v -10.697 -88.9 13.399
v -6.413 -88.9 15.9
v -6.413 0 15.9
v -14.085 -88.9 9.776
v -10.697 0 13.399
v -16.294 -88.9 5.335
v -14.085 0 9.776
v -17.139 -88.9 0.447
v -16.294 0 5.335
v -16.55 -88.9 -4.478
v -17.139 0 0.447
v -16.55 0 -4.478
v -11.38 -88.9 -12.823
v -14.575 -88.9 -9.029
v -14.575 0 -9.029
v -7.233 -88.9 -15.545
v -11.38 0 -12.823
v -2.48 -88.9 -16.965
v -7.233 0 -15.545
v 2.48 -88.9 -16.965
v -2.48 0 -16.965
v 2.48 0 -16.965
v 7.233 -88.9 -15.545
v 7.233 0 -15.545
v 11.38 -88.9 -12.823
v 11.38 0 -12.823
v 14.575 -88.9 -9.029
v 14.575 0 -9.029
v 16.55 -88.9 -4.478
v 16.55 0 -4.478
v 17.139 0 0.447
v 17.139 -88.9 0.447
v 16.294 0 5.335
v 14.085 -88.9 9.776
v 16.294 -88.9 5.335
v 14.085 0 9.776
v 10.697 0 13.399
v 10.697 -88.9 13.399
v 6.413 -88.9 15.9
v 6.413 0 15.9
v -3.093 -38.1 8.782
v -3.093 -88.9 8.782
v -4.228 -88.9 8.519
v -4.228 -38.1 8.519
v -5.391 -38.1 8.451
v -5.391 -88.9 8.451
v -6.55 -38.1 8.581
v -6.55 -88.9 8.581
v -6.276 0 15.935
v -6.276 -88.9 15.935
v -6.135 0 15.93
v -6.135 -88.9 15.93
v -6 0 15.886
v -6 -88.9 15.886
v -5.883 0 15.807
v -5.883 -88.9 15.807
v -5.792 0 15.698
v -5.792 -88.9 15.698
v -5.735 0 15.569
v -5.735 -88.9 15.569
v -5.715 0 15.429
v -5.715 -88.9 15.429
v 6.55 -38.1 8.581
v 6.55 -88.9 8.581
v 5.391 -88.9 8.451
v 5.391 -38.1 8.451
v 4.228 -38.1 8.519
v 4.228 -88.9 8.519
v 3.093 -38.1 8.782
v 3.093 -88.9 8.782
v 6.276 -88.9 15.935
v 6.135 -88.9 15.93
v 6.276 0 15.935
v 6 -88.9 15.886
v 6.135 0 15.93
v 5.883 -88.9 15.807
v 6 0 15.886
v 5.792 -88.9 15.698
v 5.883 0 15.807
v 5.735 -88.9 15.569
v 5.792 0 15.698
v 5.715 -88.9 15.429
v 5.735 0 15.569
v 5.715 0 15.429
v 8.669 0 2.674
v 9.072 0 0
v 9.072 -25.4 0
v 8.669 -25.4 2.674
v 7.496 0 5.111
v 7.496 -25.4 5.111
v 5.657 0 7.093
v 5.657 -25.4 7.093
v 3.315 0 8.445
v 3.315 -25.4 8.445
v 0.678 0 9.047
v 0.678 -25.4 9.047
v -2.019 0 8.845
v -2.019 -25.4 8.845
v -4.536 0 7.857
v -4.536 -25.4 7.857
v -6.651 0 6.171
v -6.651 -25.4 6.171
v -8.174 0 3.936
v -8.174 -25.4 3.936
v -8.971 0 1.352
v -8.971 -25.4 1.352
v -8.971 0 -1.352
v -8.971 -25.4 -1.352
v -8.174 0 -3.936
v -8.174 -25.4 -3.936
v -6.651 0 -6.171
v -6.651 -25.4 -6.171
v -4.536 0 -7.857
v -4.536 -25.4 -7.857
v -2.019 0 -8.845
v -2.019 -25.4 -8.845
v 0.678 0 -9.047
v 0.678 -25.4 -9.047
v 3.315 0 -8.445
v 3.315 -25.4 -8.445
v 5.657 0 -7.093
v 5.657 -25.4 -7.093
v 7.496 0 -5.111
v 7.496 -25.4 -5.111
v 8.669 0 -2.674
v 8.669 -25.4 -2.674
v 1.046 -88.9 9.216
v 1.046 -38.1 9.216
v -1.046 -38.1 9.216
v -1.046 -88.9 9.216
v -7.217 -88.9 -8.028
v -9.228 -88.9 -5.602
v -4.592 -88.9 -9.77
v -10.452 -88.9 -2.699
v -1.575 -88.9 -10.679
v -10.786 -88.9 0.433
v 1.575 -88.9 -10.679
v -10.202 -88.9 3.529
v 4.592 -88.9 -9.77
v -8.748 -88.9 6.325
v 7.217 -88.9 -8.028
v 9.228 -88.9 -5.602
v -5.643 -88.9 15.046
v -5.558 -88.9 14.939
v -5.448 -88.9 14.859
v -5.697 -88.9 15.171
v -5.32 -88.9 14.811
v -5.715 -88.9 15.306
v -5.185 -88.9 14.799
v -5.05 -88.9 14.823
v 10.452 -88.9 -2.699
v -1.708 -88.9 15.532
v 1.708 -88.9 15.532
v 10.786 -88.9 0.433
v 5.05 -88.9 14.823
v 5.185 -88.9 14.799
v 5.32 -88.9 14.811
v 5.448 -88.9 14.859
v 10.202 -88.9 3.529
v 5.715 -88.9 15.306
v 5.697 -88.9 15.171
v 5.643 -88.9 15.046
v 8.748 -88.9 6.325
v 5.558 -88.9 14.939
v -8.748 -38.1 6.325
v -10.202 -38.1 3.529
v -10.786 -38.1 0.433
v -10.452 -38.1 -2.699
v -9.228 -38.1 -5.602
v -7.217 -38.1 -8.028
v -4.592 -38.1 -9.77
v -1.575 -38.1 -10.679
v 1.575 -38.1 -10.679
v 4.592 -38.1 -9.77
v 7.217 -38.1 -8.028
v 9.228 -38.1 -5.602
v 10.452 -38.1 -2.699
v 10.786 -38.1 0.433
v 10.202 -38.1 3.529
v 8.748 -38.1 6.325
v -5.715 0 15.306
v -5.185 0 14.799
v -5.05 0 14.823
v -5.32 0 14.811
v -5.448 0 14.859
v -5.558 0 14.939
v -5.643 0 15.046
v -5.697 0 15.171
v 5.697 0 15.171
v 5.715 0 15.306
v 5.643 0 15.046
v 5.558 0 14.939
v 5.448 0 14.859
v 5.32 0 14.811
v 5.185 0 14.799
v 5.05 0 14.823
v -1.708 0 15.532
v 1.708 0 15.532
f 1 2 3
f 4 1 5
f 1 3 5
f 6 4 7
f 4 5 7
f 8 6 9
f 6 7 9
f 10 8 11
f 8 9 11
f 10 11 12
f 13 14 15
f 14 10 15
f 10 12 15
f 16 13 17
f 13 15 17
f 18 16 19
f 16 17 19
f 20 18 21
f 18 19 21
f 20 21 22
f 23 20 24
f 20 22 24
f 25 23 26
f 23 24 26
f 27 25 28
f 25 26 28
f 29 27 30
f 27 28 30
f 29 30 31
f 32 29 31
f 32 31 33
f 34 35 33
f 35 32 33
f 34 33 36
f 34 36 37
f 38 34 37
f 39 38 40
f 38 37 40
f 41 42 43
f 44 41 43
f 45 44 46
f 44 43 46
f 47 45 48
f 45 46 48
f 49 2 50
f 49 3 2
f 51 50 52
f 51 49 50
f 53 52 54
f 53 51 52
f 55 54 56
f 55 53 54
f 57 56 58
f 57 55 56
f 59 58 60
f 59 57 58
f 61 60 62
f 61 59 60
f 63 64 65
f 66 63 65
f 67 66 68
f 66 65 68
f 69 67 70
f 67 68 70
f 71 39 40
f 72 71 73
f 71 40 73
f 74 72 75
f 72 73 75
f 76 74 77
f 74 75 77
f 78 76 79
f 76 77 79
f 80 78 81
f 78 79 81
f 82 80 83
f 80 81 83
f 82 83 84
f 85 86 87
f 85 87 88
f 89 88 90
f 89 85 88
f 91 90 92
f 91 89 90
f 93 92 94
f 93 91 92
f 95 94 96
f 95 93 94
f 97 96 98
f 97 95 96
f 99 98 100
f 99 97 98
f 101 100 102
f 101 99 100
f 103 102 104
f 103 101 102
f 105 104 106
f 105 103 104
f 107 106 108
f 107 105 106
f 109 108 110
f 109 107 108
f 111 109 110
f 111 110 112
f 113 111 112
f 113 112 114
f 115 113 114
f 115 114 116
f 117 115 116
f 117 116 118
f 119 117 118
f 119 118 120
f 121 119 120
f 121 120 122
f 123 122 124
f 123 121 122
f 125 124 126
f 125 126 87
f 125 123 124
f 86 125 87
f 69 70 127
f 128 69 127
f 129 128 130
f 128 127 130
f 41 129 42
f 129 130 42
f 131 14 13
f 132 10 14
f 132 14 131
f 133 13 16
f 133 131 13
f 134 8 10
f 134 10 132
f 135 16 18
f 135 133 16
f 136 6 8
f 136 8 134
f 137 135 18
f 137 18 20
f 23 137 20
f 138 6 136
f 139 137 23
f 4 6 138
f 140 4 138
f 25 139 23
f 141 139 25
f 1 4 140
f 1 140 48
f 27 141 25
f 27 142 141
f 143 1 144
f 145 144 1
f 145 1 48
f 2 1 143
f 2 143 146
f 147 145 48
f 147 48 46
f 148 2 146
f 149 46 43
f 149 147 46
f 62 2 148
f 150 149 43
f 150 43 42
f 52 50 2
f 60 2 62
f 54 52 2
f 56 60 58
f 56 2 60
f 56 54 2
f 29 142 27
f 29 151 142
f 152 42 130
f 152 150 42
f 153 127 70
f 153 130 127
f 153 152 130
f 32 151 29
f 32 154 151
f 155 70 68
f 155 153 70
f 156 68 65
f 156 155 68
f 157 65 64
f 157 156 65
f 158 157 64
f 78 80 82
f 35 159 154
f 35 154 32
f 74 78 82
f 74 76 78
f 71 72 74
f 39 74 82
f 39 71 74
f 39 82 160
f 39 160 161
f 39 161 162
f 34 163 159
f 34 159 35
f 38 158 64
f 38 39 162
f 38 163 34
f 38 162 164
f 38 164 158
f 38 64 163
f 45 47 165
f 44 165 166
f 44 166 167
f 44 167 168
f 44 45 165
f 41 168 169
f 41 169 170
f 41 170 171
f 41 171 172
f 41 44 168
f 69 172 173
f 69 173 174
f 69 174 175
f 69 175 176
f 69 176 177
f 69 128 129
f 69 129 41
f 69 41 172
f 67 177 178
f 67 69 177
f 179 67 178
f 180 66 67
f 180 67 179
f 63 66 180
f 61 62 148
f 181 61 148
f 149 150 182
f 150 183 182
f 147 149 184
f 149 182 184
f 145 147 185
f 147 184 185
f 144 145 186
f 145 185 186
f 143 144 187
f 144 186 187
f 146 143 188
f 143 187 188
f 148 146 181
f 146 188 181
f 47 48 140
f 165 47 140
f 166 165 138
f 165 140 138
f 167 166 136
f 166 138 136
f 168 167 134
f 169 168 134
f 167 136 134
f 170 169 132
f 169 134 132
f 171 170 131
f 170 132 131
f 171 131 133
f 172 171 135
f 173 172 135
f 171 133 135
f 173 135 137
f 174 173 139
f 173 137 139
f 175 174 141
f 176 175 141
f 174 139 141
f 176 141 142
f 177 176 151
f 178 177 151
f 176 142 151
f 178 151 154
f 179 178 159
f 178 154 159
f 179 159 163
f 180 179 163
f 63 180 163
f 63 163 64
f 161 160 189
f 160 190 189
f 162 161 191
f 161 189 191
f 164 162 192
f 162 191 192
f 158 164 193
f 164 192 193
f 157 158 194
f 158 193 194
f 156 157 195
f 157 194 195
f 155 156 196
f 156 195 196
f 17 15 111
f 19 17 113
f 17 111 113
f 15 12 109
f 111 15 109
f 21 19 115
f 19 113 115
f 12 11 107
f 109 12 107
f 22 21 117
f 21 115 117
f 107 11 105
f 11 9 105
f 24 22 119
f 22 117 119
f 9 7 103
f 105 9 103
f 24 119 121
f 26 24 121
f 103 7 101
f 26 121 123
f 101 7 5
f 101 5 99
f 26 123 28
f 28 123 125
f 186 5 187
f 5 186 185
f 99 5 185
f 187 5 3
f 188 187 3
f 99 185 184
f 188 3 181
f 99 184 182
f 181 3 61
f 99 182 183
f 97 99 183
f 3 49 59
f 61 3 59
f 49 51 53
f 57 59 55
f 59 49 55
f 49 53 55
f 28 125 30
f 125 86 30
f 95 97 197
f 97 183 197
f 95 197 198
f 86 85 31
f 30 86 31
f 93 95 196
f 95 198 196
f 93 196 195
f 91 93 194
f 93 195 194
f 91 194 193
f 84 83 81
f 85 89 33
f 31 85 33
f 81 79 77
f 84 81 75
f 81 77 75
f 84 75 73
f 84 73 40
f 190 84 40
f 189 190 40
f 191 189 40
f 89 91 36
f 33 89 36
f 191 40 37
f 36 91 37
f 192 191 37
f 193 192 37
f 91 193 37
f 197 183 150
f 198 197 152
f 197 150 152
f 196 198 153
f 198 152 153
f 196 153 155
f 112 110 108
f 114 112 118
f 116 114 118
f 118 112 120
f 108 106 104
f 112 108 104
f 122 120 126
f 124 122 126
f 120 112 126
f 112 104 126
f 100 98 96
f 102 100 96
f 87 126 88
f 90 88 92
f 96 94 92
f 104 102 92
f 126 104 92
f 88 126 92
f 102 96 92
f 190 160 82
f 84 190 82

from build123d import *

# Parameters (mm, degrees)
F0_R     = 17.145
F0_R_2   = 9.0724925833
F1_DEPTH = 88.9
F2_DEPTH = 25.4
F4_DEPTH = 88.901
F5_R     = 0.508
F7_DEPTH = 50.8


with BuildPart() as f1:
    # F0 (on Front) → F1 (new body)
    with BuildSketch(Plane.XZ):
        Circle(F0_R)
        Circle(F0_R_2, mode=Mode.SUBTRACT)
        Circle(F0_R_2)
    extrude(amount=F1_DEPTH)

    # F0 (on Front) → F2 (cut)
    with BuildSketch(Plane.XZ):
        Circle(F0_R_2)
    extrude(amount=F2_DEPTH, mode=Mode.SUBTRACT)

    # F3 (on face) → F4 (cut, through all)
    with BuildSketch(Plane.XZ.offset(88.9)):
        with BuildLine():
            ThreePointArc((-5.715, 14.5918745599), (0, 15.621), (5.715, 14.5918745599))
            Line((5.715, 14.5918745599), (5.715, 16.1644610179))
            ThreePointArc((5.715, 16.1644610179), (2.8992534253, 16.8980873053), (0, 17.145))
            ThreePointArc((0, 17.145), (-2.8992534253, 16.8980873053), (-5.715, 16.1644610179))
            Line((-5.715, 16.1644610179), (-5.715, 14.5918745599))
        make_face()
    extrude(amount=-F4_DEPTH, mode=Mode.SUBTRACT)

    # F5
    f5_edges = [f1.edges().sort_by_distance(p)[0] for p in [
        (-5.715, -44.45, 16.164461),
        (5.715, -44.45, 16.164461),
        (-5.715, -44.45, 14.591875),
        (5.715, -44.45, 14.591875),
    ]]
    fillet(f5_edges, radius=F5_R)

    # F6 (on face) → F7 (cut)
    with BuildSketch(Plane.XZ.offset(88.9)):
        with BuildLine():
            ThreePointArc((-3.0928797021, 8.7823797249), (-4.8083158044, 8.4599845105), (-6.5495779578, 8.5810869809))
            ThreePointArc((-6.5495779578, 8.5810869809), (0, -10.7950000092), (6.5495779578, 8.5810869809))
            ThreePointArc((6.5495779578, 8.5810869809), (4.8083158044, 8.4599845105), (3.0928797021, 8.7823797249))
            ThreePointArc((3.0928797021, 8.7823797249), (0, 9.2710000092), (-3.0928797021, 8.7823797249))
        make_face()
    extrude(amount=-F7_DEPTH, mode=Mode.SUBTRACT)


solid = f1.part
